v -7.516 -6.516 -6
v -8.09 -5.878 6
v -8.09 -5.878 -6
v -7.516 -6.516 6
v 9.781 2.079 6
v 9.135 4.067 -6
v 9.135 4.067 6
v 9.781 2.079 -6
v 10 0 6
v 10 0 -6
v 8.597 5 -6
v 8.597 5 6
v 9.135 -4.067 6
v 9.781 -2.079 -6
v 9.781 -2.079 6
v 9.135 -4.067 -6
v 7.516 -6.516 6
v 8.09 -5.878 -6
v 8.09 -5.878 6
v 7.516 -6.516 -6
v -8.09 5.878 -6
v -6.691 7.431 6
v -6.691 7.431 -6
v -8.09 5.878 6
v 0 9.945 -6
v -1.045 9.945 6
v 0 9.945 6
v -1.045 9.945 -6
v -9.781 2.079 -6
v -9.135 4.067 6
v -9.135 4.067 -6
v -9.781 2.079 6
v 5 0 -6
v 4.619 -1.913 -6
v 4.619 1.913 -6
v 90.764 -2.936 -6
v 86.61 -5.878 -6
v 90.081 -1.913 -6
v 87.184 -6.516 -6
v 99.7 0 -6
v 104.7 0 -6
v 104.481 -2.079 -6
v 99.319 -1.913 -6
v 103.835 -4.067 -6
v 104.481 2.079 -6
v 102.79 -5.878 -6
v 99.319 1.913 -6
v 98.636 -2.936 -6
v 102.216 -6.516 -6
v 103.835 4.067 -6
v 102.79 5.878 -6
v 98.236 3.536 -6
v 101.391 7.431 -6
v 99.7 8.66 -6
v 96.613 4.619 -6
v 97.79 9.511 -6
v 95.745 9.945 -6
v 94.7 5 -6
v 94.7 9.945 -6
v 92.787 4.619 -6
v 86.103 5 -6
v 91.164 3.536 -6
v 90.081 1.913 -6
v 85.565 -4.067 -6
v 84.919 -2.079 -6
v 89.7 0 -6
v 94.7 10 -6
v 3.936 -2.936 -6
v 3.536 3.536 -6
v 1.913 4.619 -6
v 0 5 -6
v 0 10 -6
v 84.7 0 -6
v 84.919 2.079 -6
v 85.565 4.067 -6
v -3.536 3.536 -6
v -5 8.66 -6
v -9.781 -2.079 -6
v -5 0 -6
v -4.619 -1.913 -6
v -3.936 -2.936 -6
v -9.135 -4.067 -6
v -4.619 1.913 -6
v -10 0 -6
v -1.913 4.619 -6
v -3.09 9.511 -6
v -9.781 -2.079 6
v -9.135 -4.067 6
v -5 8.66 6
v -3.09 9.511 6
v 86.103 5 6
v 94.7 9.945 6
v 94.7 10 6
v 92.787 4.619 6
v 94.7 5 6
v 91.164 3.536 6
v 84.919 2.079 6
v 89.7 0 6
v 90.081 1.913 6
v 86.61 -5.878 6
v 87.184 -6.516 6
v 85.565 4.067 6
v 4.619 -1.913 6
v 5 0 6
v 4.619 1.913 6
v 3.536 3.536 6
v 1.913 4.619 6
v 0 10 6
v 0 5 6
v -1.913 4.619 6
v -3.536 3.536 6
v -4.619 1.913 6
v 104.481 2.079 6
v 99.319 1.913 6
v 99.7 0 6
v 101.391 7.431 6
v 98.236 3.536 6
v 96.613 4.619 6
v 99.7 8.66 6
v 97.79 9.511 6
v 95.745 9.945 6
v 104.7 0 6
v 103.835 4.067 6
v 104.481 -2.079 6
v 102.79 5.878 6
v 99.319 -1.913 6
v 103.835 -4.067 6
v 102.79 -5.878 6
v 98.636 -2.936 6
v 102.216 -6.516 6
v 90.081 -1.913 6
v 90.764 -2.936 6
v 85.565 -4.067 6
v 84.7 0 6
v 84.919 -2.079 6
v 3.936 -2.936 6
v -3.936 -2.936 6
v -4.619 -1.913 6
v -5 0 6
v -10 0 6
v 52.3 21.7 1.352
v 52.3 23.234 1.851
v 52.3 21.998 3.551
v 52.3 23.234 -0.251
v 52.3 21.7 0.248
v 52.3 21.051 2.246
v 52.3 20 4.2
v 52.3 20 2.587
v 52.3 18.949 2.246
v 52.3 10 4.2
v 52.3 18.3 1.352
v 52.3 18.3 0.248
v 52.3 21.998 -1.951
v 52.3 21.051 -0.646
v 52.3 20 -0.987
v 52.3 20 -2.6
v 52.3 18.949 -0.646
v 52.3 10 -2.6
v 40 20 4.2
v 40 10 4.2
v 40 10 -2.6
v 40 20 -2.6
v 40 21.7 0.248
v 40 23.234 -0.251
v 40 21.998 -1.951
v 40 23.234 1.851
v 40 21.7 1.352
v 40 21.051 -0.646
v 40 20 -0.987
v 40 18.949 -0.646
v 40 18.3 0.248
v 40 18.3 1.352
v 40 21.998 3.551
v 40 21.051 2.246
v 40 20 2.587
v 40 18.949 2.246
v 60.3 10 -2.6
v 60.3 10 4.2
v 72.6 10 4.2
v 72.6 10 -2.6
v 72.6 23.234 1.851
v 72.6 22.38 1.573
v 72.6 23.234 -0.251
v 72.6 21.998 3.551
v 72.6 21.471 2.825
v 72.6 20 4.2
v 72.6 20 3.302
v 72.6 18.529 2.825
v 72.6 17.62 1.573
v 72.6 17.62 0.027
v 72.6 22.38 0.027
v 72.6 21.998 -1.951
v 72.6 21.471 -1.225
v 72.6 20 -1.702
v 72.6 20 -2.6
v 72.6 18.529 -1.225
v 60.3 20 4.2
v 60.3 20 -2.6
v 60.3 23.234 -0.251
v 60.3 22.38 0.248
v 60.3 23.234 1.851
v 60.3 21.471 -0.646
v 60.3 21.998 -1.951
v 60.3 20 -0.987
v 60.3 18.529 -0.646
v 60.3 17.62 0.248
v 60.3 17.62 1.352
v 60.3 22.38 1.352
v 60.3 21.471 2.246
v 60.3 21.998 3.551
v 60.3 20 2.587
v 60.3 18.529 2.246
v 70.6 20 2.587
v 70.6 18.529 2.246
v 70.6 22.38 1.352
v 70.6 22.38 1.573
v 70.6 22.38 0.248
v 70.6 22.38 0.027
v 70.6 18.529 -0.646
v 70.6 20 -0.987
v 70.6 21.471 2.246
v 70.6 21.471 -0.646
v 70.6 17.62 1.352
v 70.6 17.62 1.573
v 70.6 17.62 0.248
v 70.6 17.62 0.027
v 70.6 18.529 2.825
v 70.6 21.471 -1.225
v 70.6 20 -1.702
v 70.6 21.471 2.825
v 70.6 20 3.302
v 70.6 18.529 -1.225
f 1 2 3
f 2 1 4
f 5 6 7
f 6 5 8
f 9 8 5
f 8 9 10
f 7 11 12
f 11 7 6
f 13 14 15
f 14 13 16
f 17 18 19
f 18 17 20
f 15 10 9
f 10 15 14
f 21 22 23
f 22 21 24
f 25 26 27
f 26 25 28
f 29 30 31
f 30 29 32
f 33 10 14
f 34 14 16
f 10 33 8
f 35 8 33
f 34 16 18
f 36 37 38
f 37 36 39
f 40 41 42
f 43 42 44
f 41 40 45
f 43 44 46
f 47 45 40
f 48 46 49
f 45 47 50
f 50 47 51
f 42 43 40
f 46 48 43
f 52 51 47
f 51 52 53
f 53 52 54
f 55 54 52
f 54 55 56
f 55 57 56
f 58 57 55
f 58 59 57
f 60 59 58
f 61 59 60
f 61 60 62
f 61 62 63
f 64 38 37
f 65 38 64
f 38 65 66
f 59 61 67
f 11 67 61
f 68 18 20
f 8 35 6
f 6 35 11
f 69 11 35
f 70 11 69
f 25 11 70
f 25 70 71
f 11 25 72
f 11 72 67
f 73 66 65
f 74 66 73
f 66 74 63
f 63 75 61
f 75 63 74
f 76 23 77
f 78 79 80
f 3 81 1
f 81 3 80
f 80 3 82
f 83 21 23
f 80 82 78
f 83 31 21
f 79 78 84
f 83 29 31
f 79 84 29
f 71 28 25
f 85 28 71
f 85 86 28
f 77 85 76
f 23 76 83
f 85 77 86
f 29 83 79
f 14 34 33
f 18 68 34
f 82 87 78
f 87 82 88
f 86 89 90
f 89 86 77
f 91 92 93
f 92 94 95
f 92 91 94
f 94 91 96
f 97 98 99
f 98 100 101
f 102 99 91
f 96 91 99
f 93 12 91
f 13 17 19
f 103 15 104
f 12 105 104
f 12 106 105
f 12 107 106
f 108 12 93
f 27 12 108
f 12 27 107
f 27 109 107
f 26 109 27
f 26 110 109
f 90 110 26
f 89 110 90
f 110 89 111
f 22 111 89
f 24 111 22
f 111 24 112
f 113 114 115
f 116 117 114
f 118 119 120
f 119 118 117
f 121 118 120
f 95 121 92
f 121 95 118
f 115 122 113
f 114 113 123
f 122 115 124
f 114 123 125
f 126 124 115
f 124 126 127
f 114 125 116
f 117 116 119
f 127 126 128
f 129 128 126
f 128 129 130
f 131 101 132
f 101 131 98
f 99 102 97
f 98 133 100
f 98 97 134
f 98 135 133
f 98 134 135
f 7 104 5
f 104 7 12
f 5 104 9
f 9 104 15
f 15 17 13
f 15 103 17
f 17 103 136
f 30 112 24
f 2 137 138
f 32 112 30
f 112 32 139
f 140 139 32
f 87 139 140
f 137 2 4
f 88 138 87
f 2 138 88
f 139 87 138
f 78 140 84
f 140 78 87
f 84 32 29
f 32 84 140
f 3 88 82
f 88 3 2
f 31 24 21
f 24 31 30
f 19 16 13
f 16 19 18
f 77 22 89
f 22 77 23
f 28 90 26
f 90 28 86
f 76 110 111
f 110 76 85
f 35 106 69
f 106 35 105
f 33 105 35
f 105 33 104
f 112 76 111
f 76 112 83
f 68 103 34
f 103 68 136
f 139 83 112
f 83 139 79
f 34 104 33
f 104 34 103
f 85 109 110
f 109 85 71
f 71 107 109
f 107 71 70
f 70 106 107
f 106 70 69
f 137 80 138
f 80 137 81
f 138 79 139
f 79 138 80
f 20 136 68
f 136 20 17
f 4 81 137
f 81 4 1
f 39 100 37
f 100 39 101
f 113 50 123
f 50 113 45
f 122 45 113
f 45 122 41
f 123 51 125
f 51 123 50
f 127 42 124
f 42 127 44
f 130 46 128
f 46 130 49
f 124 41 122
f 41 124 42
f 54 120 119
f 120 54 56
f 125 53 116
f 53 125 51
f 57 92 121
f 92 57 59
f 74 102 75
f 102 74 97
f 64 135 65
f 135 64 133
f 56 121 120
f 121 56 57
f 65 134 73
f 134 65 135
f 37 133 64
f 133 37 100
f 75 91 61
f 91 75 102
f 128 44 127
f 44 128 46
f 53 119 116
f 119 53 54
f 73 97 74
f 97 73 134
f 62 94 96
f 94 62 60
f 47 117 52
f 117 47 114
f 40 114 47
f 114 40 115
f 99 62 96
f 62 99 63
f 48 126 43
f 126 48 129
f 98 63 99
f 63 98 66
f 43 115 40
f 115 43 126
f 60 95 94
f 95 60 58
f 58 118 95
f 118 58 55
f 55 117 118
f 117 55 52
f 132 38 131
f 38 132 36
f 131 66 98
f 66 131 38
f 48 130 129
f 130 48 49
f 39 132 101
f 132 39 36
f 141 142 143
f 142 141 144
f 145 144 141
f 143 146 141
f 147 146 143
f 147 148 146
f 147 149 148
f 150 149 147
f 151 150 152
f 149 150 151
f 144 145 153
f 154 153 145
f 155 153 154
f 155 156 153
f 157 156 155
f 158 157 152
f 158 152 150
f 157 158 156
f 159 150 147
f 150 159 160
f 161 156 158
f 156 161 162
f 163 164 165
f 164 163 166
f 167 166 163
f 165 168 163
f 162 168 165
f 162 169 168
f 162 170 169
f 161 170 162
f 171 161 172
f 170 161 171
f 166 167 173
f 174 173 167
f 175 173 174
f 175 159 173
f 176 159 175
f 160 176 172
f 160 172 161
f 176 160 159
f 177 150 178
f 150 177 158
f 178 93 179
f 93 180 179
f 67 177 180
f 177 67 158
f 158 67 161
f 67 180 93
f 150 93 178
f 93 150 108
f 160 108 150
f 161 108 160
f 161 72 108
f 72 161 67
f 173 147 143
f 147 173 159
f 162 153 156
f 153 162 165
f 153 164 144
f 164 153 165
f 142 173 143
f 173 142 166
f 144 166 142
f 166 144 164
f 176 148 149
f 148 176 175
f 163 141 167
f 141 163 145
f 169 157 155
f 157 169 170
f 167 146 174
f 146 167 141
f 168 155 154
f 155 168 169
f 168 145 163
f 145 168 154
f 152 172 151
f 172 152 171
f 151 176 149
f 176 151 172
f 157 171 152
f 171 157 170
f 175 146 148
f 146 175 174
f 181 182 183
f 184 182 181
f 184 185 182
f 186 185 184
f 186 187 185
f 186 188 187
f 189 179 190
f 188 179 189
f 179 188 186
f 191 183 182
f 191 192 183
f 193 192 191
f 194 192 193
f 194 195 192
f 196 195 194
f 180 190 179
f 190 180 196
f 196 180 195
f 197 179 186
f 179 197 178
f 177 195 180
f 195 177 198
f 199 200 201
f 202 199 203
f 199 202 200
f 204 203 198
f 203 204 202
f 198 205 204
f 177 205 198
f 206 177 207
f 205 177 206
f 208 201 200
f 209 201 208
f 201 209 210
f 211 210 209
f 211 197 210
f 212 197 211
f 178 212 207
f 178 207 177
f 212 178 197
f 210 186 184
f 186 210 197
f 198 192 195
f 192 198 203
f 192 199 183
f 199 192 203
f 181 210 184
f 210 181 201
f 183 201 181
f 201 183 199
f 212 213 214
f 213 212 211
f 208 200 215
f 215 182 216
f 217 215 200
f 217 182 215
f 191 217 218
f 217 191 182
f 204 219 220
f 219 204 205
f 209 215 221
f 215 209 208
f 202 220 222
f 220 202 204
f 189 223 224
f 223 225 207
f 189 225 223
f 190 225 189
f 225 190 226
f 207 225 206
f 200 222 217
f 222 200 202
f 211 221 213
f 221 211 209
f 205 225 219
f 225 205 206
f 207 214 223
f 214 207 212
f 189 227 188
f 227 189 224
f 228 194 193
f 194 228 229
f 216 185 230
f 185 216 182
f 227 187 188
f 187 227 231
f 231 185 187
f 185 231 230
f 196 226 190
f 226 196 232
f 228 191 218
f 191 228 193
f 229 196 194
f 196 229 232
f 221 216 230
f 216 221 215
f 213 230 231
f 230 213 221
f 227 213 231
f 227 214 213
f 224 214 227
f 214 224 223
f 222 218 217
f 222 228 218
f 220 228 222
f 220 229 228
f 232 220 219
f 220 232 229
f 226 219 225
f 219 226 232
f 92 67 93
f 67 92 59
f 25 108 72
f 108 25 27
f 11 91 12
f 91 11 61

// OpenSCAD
/*
This is a mount for the Logitech C270 webcam to attach to the two poles on a car headrest.  May work for other Logitech webcams with similar attachment.
These headrest poles fit a 2016 Subaru Outback.
*/

//Diameter of headrest pole
HeadrestPoleDiameter=10;
//Diameter of the mount (how thick the mount is)
HeadrestPoleMountDiameter=20;
//Height of the mount
HeadrestPoleMountHeight=12;
//Distance between the headrest poles
HeadrestPoleSeparationDistance=84.7;
//Offset of where the webcam mount is located
WebcamAttachmentOffset=40;
PegHeaderHeight=2;

module cylinder_outer(height,radius,fn){
   fudge = 1/cos(180/fn);
   cylinder(h=height,r=radius*fudge,$fn=fn);}

difference(){
    cylinder(h=HeadrestPoleMountHeight, d=HeadrestPoleMountDiameter, center=true);
    cylinder(h=HeadrestPoleMountHeight, d=HeadrestPoleDiameter, center=true);
    translate([0,1,-HeadrestPoleMountHeight/2]) { rotate([0,0,-135]) { cube([HeadrestPoleMountDiameter,HeadrestPoleMountDiameter,HeadrestPoleMountHeight]); } }
}

translate([0,HeadrestPoleDiameter/2,-HeadrestPoleMountHeight/2]) {
    cube([HeadrestPoleSeparationDistance+HeadrestPoleDiameter, (HeadrestPoleMountDiameter-HeadrestPoleDiameter)/2, HeadrestPoleMountHeight]);
}

translate([HeadrestPoleSeparationDistance+HeadrestPoleDiameter,0,0]) {
    difference(){
        cylinder(h=HeadrestPoleMountHeight, d=HeadrestPoleMountDiameter, center=true);
        cylinder(h=HeadrestPoleMountHeight, d=HeadrestPoleDiameter, center=true);
        translate([0,1,-HeadrestPoleMountHeight/2]) { rotate([0,0,-135]) { cube([HeadrestPoleMountDiameter,HeadrestPoleMountDiameter,HeadrestPoleMountHeight]); } }
    }
}

translate([WebcamAttachmentOffset,HeadrestPoleMountDiameter/2,-(HeadrestPoleMountHeight-6.8)/2]){
    difference(){
        union(){
            cube([12.3,10,6.8]);
            rotate([0,90,0]) {
                translate([-6.8/2,10,12.3/2]) {
                    cylinder(h=12.3, d=6.8, $fn=10, center=true);
                    }
            }
        }
        rotate([0,90,0]) {
            translate([-6.8/2,10,12.3/2]) {
                //cylinder(h=12.3, d=3, , center=true);
                cylinder(h=12.3, r=3.4/2*1/cos(180/10), $fn=10, center=true);
            }
        }
    }
}

translate([WebcamAttachmentOffset+20.3,HeadrestPoleMountDiameter/2,-(HeadrestPoleMountHeight-6.8)/2]){
    difference(){
        union(){
            cube([12.3,10,6.8]);
            rotate([0,90,0]) {
                translate([-6.8/2,10,12.3/2]) {
                    cylinder(h=12.3, d=6.8, $fn=10, center=true);
                }
            }
        }
        rotate([0,90,0]) {
            translate([-6.8/2,10,12.3/2]) {
                cylinder(h=12.3, r=3.4/2*1/cos(180/10), $fn=10, center=true);
            }
        }
        rotate([0,90,0]) {
            translate([-6.8/2,10,12.3/2]) {
                scale([1,1.4,1]) {
                    cylinder(h=12.3, r=3.4/2*1/cos(180/10), $fn=10, center=true);
                }
            }
        }
        rotate([0,90,0]) {
            translate([-6.8/2,10,12.3-(PegHeaderHeight/2)]) {
                cylinder(h=PegHeaderHeight, r=1.4*3.4/2*1/cos(180/10), $fn=10, center=true);
            }
        }
    }
}


echo(version=version());
// Written by xoque (mwifall@gmail.com)
//
// To the extent possible under law, the author(s) have dedicated all
// copyright and related and neighboring rights to this software to the
// public domain worldwide. This software is distributed without any
// warranty.
//
// You should have received a copy of the CC0 Public Domain
// Dedication along with this software.
// If not, see <http://creativecommons.org/publicdomain/zero/1.0/>.
